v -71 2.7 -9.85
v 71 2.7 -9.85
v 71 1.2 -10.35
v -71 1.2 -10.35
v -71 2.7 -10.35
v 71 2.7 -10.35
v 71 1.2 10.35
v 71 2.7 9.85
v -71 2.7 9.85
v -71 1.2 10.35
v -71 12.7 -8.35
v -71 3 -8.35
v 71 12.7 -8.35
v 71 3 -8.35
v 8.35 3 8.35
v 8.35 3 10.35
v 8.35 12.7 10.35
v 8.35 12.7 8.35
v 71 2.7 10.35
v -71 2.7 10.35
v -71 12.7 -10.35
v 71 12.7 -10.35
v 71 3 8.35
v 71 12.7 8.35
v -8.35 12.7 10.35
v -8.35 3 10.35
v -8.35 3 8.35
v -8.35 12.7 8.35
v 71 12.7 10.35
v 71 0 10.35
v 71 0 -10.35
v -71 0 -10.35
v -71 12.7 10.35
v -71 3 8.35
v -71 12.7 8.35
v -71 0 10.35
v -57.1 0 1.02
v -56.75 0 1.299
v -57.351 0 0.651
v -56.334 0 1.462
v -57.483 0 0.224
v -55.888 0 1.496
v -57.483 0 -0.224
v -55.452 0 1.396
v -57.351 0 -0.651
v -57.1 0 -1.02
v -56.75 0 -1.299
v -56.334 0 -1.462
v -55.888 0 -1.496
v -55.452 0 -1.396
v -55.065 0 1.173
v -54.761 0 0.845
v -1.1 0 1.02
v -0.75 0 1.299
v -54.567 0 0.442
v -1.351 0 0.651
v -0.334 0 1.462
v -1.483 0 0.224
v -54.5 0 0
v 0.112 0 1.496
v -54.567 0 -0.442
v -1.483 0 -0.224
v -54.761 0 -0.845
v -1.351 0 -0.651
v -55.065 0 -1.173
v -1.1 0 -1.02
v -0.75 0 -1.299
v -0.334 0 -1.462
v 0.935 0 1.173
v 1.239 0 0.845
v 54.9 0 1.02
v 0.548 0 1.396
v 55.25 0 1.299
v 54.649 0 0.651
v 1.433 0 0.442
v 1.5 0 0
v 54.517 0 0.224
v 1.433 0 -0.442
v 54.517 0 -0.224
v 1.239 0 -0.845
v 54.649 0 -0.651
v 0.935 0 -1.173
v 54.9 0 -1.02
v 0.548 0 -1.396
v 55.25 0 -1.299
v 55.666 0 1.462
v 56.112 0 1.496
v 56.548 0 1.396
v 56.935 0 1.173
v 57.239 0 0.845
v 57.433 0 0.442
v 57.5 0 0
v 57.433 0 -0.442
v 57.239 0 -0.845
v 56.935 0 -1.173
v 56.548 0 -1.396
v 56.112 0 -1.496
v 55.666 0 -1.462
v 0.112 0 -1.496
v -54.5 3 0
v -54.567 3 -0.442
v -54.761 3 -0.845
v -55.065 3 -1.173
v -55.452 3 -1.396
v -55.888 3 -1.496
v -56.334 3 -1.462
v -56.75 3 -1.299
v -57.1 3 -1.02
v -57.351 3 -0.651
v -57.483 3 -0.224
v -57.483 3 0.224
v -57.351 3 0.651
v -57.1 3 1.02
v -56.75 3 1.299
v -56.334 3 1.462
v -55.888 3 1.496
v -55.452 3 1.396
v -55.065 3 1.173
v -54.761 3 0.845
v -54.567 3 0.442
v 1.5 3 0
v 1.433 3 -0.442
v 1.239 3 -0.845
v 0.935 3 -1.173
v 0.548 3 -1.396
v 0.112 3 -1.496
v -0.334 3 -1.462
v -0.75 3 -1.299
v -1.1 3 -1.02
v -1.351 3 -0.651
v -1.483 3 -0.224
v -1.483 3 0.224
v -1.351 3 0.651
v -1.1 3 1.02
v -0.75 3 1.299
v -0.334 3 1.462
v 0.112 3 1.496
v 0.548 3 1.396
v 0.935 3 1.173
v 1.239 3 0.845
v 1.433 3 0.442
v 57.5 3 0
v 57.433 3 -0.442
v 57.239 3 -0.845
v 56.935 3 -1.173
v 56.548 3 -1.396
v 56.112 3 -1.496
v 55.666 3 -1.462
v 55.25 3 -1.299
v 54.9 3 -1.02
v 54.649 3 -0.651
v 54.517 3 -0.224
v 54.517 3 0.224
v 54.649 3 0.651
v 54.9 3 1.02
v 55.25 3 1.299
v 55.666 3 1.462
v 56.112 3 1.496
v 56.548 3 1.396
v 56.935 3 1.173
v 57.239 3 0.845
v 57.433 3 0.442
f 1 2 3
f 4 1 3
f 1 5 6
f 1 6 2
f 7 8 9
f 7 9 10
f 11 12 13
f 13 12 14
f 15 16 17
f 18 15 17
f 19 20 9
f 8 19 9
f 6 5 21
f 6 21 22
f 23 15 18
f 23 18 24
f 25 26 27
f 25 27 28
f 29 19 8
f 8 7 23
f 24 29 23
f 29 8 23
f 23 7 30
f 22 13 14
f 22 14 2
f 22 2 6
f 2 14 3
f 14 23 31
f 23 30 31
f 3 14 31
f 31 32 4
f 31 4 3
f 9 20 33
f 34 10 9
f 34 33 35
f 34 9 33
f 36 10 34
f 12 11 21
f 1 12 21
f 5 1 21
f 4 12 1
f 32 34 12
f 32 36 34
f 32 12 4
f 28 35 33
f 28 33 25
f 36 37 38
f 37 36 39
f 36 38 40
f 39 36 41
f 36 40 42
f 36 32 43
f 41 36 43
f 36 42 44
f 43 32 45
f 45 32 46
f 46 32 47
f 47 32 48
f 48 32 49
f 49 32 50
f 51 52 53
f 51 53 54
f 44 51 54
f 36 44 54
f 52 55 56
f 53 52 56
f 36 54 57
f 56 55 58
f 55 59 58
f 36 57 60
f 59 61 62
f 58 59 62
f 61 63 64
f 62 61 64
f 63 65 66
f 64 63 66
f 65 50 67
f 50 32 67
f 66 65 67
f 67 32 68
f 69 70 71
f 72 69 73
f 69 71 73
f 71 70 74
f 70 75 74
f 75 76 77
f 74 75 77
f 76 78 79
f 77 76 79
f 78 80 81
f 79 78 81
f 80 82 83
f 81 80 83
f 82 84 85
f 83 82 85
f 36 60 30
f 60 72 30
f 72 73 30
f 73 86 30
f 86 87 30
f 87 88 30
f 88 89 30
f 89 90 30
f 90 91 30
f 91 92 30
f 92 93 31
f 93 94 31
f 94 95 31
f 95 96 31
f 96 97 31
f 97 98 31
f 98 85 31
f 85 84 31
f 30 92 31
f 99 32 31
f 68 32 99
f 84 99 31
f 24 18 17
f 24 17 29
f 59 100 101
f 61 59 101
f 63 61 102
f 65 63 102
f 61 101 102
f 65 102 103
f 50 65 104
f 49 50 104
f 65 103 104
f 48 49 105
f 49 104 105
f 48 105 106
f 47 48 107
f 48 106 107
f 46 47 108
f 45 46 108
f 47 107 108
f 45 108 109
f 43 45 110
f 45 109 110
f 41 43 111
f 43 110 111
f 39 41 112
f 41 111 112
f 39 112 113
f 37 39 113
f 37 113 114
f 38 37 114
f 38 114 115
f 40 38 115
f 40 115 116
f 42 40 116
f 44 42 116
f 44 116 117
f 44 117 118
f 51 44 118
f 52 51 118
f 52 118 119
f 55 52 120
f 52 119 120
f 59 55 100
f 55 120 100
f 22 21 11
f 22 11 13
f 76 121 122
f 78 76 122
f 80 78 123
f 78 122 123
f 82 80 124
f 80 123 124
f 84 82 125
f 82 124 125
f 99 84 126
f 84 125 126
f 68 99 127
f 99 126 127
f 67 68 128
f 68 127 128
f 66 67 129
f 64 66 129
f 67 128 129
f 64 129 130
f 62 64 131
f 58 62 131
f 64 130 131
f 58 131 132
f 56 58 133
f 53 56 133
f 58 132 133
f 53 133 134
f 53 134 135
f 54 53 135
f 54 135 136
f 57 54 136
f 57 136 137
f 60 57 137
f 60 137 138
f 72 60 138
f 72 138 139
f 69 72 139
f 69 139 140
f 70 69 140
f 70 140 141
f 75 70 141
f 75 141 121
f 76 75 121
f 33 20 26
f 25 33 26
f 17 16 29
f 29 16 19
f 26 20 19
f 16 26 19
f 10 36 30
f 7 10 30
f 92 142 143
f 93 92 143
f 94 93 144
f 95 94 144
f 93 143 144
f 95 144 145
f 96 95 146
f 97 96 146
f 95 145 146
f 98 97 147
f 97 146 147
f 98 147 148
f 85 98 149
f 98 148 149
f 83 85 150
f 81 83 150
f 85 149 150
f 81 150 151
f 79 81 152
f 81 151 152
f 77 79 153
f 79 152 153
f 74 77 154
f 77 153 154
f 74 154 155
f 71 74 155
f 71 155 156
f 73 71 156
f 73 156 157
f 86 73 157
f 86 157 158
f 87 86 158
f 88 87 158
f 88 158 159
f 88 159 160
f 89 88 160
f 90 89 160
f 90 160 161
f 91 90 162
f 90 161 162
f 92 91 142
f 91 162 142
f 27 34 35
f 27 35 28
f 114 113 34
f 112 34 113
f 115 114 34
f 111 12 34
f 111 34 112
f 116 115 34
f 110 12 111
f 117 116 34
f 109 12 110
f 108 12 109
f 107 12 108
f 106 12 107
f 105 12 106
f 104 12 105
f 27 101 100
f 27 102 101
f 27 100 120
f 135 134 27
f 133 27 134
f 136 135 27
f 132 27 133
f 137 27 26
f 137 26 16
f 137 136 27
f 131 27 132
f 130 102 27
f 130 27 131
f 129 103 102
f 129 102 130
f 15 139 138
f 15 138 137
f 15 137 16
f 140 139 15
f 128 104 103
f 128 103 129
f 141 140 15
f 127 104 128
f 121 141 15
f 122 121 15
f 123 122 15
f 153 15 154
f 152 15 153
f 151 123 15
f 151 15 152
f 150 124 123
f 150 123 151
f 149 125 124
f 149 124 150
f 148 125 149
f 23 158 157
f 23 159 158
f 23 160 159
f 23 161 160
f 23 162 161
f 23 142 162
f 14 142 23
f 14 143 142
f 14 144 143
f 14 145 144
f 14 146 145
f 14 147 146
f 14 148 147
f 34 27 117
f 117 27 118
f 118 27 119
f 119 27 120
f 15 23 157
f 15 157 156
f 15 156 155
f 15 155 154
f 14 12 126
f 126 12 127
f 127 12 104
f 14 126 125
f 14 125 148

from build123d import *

# Parameters (mm, degrees)
CROQUIS1_W              = 142
CROQUIS1_H              = 20.7
SALIENTE_EXTRUIR2_DEPTH = 3
CROQUIS6_R              = 1.5
CORTAR_EXTRUIR4_DEPTH   = 3
CROQUIS7_W              = 142
CROQUIS7_H              = 2
SALIENTE_EXTRUIR3_DEPTH = 9.7
CORTAR_EXTRUIR5_DEPTH   = 224
CROQUIS10_W             = 16.7
CROQUIS10_H             = 9.7
CORTAR_EXTRUIR6_DEPTH   = 10


with BuildPart() as part:
    # Croquis1 → Saliente-Extruir2 (new body)
    with BuildSketch(Plane(origin=(0, 0, 0), x_dir=(1, 0, 0), z_dir=(0, 1, 0))):
        Rectangle(CROQUIS1_W, CROQUIS1_H)
    extrude(amount=SALIENTE_EXTRUIR2_DEPTH)

    # Croquis6 → Cortar-Extruir4 (cut)
    with BuildSketch(Plane(origin=(0, 3, 0), x_dir=(1, 0, 0), z_dir=(0, 1, 0))):
        with Locations((-56, 0)):
            Circle(CROQUIS6_R)
        Circle(CROQUIS6_R)
        with Locations((56, 0)):
            Circle(CROQUIS6_R)
    extrude(amount=-CORTAR_EXTRUIR4_DEPTH, mode=Mode.SUBTRACT)

    # Croquis7 → Saliente-Extruir3 (add)
    with BuildSketch(Plane(origin=(0, 3, 0), x_dir=(1, 0, 0), z_dir=(0, 1, 0))):
        with Locations((0, 9.35)):
            Rectangle(CROQUIS7_W, CROQUIS7_H)
        with Locations((0, -9.35)):
            Rectangle(CROQUIS7_W, CROQUIS7_H)
    extrude(amount=SALIENTE_EXTRUIR3_DEPTH)

    # Croquis9 → Cortar-Extruir5 (cut)
    with BuildSketch(Plane.ZY.offset(71)):
        Polygon((-10.35, 2.7), (-9.85, 2.7), (-10.35, 1.2), align=None)
        Polygon((10.35, 2.7), (9.85, 2.7), (10.35, 1.2), align=None)
    extrude(amount=-CORTAR_EXTRUIR5_DEPTH, mode=Mode.SUBTRACT)

    # Croquis10 → Cortar-Extruir6 (cut)
    with BuildSketch(Plane.XY.offset(10.35)):
        with Locations((0, 7.85)):
            Rectangle(CROQUIS10_W, CROQUIS10_H)
    extrude(amount=-CORTAR_EXTRUIR6_DEPTH, mode=Mode.SUBTRACT)


solid = part.part
